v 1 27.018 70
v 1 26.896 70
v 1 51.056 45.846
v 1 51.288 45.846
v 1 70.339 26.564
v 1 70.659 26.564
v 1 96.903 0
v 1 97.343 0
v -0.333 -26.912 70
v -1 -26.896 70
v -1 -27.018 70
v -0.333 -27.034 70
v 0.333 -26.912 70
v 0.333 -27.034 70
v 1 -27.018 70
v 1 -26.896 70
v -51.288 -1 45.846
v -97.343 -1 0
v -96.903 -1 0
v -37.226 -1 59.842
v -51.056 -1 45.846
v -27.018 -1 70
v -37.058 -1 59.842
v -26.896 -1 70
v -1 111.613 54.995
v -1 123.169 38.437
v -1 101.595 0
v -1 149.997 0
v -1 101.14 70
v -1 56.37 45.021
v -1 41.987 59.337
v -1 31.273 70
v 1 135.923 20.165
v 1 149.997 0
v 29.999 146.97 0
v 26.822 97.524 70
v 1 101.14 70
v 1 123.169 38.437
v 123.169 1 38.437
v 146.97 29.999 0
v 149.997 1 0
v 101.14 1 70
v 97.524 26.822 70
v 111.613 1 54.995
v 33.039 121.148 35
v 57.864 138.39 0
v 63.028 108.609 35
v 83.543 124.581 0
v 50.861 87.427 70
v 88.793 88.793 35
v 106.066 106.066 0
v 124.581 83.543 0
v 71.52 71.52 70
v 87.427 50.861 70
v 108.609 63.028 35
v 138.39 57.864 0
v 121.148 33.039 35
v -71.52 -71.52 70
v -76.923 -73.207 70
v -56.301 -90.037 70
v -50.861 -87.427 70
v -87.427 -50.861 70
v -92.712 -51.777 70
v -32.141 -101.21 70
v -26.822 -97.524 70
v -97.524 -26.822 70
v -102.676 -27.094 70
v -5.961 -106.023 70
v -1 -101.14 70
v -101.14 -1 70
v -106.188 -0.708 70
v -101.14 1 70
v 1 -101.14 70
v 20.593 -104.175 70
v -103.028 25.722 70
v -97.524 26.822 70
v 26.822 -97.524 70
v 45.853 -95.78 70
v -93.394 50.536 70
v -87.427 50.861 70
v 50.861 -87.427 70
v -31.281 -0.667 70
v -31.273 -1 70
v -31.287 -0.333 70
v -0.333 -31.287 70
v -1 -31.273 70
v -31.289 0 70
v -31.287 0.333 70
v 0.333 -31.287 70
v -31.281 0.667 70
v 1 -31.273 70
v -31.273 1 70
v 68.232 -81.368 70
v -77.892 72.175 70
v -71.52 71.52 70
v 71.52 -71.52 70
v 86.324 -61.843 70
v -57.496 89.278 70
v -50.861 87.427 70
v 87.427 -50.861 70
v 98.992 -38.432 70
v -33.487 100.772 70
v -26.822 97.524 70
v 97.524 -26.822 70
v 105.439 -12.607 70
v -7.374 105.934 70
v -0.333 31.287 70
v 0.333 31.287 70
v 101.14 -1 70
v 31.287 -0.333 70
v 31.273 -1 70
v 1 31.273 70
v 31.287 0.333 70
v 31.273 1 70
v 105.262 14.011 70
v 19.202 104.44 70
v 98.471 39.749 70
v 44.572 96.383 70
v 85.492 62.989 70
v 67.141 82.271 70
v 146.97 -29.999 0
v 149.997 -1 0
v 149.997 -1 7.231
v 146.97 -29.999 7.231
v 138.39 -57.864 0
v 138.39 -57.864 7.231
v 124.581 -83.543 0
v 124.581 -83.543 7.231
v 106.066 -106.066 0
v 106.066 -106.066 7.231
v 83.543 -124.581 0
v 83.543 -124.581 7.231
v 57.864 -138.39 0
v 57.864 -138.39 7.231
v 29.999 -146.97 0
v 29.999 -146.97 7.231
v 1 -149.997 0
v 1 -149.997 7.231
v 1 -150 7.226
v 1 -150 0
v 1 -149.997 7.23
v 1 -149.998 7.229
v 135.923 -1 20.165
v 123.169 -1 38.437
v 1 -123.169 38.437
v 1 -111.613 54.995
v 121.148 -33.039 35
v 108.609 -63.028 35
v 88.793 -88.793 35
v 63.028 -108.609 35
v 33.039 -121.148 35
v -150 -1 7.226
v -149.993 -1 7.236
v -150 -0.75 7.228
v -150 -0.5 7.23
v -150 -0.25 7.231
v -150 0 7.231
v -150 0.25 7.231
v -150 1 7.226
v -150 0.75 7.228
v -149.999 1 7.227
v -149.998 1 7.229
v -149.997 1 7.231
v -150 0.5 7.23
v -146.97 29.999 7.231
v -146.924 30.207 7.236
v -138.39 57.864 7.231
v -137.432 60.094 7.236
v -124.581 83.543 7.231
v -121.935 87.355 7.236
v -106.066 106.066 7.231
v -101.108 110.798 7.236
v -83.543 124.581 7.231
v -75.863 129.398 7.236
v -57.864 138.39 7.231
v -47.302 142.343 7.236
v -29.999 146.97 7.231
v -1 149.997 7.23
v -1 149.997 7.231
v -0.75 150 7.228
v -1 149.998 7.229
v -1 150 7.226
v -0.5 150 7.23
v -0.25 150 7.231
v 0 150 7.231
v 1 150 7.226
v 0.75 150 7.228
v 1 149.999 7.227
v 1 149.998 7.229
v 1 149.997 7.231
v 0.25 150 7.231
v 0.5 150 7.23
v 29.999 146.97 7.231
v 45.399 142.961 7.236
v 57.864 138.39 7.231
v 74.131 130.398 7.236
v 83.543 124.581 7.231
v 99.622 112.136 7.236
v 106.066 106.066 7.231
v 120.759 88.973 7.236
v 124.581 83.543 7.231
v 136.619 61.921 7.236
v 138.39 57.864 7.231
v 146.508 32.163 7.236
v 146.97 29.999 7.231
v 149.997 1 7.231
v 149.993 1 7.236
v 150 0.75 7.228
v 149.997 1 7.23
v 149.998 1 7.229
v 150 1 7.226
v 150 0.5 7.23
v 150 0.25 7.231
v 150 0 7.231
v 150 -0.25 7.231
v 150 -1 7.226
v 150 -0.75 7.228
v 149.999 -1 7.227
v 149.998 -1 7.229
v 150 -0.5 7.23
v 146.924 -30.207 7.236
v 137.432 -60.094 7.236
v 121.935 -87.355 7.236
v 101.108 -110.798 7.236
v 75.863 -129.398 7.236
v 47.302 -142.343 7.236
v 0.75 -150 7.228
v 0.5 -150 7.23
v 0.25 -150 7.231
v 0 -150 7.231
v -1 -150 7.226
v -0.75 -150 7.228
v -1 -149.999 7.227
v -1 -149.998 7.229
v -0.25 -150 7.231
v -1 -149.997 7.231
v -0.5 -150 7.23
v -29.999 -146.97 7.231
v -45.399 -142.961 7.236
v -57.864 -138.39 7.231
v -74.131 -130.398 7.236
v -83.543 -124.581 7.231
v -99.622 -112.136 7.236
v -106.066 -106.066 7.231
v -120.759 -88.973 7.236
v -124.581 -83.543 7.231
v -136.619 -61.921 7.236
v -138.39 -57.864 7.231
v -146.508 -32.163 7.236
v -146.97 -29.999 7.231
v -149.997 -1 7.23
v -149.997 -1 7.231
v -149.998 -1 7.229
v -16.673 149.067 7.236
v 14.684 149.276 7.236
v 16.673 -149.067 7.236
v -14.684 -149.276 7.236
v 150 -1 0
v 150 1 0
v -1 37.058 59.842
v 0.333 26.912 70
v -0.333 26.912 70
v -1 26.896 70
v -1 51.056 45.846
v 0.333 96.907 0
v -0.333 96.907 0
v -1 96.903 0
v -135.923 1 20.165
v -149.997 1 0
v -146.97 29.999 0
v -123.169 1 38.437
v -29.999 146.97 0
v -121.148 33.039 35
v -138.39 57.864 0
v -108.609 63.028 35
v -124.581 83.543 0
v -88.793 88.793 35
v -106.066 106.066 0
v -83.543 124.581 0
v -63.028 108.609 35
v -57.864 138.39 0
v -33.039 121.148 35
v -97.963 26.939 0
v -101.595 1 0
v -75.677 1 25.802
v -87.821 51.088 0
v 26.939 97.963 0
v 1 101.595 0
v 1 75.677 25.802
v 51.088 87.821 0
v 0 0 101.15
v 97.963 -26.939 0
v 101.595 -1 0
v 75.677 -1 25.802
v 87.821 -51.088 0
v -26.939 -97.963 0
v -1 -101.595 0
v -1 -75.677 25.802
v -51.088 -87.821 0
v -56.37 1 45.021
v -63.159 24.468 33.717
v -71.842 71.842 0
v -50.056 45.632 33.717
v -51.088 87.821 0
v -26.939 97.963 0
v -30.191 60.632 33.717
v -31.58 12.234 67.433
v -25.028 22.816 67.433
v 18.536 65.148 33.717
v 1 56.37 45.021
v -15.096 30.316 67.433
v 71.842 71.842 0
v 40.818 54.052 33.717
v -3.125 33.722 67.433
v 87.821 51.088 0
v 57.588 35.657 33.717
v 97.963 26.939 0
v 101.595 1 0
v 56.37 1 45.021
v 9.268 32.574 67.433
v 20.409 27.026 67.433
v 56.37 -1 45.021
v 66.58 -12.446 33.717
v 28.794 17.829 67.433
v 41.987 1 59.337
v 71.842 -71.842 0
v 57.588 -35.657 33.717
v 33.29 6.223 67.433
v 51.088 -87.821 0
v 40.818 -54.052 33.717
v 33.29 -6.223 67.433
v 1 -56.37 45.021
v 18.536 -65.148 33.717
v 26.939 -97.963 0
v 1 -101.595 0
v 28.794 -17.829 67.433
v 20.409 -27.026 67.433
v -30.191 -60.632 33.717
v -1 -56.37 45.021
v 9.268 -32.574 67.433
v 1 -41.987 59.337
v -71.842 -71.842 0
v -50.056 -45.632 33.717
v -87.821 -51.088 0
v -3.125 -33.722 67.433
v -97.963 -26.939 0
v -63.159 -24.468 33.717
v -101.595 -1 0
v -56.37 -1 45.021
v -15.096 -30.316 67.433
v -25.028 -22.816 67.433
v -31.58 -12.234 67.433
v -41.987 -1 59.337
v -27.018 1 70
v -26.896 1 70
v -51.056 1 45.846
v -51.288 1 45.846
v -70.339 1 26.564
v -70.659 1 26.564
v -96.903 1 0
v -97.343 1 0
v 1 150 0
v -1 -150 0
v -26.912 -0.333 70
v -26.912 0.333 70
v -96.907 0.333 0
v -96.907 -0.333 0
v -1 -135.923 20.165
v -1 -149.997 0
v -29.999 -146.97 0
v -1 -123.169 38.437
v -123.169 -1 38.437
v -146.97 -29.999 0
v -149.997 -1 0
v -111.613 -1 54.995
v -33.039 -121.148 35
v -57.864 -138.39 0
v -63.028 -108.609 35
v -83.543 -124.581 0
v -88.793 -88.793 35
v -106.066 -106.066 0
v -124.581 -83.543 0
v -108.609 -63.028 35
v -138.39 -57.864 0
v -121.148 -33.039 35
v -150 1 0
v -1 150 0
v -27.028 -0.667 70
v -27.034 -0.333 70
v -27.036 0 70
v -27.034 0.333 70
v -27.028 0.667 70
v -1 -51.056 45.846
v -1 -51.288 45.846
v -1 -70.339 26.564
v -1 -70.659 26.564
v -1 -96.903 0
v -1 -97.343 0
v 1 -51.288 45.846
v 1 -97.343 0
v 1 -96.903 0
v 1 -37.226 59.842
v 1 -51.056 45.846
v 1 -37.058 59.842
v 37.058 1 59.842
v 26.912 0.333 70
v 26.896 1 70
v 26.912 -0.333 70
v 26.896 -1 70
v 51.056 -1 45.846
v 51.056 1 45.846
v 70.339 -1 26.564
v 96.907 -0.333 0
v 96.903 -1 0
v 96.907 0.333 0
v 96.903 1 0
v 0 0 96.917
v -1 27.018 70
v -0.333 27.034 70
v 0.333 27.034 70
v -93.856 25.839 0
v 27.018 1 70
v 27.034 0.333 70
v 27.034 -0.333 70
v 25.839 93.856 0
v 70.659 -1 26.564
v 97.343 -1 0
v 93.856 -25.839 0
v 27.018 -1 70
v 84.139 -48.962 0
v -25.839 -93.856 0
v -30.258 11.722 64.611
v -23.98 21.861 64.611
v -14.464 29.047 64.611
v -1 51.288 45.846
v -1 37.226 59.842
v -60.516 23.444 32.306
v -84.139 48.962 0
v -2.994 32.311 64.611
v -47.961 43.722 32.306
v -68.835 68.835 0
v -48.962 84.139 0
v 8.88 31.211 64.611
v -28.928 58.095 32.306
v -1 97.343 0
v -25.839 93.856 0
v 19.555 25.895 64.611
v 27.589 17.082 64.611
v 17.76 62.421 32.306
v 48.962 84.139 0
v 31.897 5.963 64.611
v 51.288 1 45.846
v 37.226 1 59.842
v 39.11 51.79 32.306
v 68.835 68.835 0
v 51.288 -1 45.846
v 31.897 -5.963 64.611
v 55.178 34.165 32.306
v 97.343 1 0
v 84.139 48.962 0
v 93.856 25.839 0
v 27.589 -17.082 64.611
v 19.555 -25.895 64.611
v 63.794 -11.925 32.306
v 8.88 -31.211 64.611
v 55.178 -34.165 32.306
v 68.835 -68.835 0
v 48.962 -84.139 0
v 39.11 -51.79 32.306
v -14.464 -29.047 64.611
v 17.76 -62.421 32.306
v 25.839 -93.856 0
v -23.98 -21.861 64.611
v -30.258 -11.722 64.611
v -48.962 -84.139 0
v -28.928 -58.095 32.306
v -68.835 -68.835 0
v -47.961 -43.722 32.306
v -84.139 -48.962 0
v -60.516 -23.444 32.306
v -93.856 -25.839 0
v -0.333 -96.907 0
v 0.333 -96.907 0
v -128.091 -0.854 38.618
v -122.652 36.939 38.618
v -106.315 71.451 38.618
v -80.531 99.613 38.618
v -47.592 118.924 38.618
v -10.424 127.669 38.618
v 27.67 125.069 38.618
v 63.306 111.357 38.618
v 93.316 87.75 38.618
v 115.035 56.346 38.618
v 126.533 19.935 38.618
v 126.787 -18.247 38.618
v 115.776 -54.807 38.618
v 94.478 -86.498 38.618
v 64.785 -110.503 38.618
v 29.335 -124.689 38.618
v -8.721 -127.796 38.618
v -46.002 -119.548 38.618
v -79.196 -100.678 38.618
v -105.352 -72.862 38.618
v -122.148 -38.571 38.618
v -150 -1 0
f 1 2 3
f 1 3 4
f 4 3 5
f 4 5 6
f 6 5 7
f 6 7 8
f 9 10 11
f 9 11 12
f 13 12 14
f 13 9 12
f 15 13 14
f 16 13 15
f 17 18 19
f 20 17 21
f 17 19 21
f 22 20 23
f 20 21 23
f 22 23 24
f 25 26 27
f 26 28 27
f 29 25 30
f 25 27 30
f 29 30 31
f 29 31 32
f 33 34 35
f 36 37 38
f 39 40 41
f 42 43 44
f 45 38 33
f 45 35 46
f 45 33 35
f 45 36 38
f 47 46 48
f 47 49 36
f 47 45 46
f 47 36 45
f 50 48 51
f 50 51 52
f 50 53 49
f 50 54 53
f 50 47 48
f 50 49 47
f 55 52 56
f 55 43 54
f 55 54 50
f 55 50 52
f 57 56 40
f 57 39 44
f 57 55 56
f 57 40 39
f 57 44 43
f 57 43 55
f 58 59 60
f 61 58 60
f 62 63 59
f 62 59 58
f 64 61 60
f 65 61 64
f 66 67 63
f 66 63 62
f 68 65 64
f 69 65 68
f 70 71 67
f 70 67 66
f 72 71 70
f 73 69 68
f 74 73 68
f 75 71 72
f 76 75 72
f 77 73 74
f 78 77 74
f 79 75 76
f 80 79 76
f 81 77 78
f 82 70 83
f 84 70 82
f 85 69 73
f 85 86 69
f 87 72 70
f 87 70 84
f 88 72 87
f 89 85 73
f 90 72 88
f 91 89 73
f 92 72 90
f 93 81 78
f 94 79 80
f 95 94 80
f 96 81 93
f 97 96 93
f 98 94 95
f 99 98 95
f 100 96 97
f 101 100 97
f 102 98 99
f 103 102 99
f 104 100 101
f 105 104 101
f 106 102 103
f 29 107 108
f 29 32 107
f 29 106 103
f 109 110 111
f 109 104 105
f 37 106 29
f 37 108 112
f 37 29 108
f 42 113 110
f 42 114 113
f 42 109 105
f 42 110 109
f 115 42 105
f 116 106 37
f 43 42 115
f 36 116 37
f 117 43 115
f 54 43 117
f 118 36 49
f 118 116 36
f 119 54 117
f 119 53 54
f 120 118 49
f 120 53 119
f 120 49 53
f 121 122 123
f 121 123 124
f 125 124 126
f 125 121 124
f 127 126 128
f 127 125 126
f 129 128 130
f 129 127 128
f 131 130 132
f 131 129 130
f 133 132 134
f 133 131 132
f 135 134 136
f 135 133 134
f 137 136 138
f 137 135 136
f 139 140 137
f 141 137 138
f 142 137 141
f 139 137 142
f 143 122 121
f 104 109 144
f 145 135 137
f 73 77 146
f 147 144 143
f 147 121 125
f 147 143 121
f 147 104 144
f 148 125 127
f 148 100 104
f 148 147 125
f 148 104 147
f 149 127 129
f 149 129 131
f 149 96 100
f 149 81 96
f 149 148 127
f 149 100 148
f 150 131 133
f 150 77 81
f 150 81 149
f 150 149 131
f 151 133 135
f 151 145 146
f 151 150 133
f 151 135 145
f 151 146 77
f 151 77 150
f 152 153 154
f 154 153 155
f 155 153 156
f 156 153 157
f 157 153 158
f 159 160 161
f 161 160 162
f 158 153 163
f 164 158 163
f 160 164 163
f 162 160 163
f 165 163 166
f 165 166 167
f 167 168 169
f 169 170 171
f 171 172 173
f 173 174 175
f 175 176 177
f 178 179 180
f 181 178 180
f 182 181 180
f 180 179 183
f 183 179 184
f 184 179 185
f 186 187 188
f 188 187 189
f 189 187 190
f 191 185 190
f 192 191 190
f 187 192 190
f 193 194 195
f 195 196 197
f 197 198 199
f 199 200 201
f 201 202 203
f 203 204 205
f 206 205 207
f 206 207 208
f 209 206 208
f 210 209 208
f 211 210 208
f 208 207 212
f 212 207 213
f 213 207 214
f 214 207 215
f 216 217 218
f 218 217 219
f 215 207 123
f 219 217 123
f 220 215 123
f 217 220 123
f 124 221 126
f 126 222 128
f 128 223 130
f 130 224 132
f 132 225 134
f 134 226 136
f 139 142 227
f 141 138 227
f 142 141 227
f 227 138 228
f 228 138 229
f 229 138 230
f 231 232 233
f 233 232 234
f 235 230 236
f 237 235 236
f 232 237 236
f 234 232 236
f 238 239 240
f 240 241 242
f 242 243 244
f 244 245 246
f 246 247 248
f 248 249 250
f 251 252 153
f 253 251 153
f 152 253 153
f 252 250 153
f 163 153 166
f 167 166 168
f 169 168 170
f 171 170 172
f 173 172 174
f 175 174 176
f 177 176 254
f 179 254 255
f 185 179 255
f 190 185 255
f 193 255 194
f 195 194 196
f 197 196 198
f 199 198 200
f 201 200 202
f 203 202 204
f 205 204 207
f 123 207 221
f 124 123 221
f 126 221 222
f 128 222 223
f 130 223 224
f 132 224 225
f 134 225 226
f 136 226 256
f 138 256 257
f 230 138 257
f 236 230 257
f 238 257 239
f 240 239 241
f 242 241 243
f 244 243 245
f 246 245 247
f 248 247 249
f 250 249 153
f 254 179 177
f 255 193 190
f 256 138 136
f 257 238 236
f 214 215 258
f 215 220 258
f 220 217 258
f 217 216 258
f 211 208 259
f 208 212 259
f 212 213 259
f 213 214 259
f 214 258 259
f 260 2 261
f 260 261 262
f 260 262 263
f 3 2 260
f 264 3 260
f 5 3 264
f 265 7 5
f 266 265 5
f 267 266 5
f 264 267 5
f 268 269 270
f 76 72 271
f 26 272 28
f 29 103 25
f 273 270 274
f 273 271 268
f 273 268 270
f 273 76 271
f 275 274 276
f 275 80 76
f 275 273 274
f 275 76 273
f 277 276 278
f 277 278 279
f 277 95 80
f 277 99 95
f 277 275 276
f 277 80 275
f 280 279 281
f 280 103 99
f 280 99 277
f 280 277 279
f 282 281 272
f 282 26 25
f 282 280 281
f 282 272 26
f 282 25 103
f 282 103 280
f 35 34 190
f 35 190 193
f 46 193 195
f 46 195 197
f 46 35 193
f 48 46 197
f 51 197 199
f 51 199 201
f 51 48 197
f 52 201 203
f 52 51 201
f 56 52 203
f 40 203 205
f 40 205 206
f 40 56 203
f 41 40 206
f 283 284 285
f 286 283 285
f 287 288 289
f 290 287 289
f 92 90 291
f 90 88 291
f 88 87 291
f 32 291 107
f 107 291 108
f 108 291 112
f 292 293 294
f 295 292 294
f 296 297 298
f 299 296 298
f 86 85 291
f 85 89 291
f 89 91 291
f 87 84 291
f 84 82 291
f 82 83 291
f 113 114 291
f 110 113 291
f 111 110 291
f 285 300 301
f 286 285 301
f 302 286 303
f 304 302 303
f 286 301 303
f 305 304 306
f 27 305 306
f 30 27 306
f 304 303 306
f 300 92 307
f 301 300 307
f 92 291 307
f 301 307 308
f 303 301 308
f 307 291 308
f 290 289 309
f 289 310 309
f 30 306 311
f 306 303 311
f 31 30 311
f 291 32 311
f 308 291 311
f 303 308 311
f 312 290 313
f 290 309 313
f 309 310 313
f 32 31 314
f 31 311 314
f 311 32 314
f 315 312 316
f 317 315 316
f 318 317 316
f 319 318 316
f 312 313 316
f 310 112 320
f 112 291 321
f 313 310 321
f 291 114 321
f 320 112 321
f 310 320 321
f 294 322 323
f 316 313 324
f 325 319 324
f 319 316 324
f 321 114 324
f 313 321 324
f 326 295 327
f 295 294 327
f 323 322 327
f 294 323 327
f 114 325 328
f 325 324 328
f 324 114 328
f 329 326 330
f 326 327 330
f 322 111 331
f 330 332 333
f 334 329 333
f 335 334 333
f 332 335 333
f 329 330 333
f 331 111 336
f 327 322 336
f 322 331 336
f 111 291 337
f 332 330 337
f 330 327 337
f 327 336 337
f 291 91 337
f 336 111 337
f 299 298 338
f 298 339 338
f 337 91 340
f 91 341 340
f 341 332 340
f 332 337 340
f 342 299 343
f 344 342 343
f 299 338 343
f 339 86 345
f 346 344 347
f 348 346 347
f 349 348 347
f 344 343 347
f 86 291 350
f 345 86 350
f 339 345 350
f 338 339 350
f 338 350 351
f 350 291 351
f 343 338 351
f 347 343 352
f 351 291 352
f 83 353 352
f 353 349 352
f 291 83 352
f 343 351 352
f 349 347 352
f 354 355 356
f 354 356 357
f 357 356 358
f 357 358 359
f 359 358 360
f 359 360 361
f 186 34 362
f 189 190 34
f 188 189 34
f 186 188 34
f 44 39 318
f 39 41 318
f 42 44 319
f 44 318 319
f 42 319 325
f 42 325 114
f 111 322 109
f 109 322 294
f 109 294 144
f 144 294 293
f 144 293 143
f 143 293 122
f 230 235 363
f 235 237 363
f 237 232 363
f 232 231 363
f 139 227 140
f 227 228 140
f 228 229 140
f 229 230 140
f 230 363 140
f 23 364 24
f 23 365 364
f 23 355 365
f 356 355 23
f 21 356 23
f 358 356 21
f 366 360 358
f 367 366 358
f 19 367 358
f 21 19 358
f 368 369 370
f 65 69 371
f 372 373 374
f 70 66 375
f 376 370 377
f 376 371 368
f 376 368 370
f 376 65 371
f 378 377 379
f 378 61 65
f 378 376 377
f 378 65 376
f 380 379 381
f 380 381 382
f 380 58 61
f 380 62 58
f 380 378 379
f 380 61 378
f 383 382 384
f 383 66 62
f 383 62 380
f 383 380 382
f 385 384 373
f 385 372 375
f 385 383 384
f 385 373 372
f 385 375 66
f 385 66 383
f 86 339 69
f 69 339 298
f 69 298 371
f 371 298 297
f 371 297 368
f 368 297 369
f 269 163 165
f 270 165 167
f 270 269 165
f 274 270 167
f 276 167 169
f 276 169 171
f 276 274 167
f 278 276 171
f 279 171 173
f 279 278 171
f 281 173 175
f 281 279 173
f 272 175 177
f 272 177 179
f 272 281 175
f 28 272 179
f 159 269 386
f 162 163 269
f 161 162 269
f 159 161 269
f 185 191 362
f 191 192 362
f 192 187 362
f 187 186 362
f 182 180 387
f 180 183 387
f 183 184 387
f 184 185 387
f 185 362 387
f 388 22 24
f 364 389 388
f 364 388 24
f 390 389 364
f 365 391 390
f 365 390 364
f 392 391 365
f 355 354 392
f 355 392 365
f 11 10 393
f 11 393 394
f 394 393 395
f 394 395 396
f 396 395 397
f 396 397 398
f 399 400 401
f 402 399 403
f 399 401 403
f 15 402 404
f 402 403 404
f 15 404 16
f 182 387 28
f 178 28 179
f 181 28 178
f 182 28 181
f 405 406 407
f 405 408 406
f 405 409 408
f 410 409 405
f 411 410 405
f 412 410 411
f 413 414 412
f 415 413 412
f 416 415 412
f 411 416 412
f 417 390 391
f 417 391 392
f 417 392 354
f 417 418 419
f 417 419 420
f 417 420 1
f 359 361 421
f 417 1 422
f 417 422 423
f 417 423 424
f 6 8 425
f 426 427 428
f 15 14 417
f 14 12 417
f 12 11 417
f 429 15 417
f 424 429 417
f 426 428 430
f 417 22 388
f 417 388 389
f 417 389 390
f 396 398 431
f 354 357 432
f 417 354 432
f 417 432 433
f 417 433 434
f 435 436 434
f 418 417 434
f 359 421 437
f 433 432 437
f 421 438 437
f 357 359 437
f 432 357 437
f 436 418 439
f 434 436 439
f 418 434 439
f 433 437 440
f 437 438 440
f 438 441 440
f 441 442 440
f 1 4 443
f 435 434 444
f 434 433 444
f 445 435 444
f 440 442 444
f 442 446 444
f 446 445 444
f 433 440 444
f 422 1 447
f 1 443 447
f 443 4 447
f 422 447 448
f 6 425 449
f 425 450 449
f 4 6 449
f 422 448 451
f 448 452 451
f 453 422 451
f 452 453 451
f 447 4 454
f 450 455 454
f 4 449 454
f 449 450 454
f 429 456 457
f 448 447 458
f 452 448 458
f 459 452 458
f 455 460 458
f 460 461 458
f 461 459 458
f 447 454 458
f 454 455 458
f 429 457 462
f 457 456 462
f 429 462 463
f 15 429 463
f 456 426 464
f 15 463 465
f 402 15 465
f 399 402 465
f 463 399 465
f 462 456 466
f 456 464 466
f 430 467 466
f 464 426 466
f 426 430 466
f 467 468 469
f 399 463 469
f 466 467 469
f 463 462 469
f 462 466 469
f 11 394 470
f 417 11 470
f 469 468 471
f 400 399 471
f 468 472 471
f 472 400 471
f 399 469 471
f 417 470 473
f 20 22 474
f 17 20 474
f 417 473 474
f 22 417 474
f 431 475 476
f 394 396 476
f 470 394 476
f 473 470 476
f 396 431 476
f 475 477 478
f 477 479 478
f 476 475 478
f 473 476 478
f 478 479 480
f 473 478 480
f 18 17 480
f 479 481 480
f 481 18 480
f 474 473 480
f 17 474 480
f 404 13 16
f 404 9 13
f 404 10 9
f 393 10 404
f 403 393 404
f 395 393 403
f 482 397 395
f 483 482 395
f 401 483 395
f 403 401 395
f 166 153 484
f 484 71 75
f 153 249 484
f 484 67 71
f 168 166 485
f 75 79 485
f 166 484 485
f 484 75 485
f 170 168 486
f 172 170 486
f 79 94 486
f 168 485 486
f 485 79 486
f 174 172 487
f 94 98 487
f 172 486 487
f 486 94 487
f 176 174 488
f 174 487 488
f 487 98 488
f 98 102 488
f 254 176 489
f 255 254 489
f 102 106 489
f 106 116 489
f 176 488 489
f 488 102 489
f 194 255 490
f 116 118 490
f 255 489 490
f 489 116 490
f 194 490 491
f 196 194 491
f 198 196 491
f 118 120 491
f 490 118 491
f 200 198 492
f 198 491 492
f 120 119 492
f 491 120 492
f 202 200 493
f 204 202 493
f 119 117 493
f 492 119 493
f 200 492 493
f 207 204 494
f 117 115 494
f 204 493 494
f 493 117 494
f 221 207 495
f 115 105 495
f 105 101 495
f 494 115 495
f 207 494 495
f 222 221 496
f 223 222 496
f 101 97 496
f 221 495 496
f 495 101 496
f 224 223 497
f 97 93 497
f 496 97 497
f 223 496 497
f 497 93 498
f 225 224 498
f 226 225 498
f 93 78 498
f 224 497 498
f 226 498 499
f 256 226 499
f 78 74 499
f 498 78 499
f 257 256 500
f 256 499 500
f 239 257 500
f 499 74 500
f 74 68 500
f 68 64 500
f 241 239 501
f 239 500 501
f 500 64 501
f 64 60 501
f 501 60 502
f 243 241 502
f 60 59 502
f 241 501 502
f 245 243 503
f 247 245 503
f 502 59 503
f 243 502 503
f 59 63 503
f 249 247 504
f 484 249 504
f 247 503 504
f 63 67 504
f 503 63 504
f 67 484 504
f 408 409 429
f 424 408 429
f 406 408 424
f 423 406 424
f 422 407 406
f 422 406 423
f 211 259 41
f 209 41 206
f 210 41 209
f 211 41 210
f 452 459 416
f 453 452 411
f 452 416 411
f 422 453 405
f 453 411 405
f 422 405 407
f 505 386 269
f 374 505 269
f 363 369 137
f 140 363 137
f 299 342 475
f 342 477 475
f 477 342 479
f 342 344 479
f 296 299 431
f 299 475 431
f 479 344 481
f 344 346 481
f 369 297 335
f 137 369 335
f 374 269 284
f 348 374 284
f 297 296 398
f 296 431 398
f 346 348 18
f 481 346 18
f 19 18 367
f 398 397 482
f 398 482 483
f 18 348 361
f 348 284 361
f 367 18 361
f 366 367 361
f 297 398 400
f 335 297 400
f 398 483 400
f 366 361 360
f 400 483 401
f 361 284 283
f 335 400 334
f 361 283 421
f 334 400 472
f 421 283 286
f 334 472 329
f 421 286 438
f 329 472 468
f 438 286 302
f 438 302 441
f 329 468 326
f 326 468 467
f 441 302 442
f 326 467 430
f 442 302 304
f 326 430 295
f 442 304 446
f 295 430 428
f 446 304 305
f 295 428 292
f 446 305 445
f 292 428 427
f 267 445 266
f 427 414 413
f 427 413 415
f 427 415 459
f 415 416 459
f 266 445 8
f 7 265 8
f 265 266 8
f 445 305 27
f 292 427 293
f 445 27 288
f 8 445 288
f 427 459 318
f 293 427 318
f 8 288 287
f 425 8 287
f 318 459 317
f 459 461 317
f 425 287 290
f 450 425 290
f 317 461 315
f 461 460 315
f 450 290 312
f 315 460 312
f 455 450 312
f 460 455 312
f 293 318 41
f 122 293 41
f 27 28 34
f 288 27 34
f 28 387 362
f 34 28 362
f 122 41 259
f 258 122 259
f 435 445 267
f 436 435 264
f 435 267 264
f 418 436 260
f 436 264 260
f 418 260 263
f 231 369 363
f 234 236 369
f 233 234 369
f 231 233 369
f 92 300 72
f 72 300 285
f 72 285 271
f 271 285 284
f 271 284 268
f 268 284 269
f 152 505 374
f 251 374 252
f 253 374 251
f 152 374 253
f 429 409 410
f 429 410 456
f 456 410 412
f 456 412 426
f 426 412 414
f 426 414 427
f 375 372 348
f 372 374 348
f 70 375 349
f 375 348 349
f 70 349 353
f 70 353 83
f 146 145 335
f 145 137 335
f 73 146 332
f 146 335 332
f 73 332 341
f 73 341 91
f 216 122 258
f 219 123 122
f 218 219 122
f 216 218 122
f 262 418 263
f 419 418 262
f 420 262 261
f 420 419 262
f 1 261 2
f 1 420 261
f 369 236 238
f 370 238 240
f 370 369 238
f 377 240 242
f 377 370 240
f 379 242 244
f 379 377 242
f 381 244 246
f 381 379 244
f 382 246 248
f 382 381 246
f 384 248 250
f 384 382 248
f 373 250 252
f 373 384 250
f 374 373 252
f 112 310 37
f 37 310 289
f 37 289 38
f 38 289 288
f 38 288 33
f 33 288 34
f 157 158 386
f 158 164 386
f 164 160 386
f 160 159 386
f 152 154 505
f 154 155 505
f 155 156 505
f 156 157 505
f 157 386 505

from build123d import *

# Parameters (mm, degrees)
BOSS_EXTRUDE1_DEPTH = 70


with BuildPart() as part:
    # Sketch1 → Revolve1 (revolve)
    with BuildSketch(Plane(origin=(0, 0, 0), x_dir=(0, 0, -1), z_dir=(1, 0, 0)), mode=Mode.PRIVATE) as revolve1_sk:
        Polygon((0, 101.6), (-101.15, 0), (-96.916744498, 0), (0, 97.347911428), align=None)
    revolve(revolve1_sk.sketch.rotate(Axis((0, 0, 101.15), (0, 0, -1)), 270), axis=Axis((0, 0, 101.15), (0, 0, -1)))

    # Sketch3 → Boss-Extrude1 (add)
    with BuildSketch(Plane.XY):
        Polygon((-1, 1), (-150, 1), (-150, -1), (-1, -1), (-1, -150), (1, -150), (1, -1), (150, -1), (150, 1), (1, 1), (1, 150), (-1, 150), align=None)
    extrude(amount=BOSS_EXTRUDE1_DEPTH)

    # Sketch5 → Cut-Revolve1 (revolve, cut)
    with BuildSketch(Plane(origin=(0, 0, 0), x_dir=(0, 0, -1), z_dir=(1, 0, 0))):
        Polygon((-96.916744498, 0), (6.133899753, 103.041259066), (0, 0), align=None)
    revolve(axis=Axis((0, 0, 0), (0, 0, 1)), mode=Mode.SUBTRACT)

    # Sketch6 → Revolve2 (revolve)
    with BuildSketch(Plane(origin=(0, 0, 0), x_dir=(0, 0, -1), z_dir=(1, 0, 0))):
        Polygon((0, 150), (-70, 101.145056725), (-70, 106.195161711), (-7.235856299, 150), align=None)
    revolve(axis=Axis((0, 0, 106.204880544), (0, 0, -1)))

    # Sketch7 → Cut-Revolve2 (revolve, cut)
    with BuildSketch(Plane(origin=(0, 0, 0), x_dir=(0, 0, -1), z_dir=(1, 0, 0)), mode=Mode.PRIVATE) as cut_revolve2_sk:
        Polygon((-7.235856299, 149.99666663), (-70, 106.190453294), (-70, 150), (-70, 151.803393864), (-4.647235207, 151.803393864), align=None)
    revolve(cut_revolve2_sk.sketch.rotate(Axis((0, 0, 108.547255844), (0, 0, -1)), 269.618033807), axis=Axis((0, 0, 108.547255844), (0, 0, -1)), mode=Mode.SUBTRACT)


solid = part.part
